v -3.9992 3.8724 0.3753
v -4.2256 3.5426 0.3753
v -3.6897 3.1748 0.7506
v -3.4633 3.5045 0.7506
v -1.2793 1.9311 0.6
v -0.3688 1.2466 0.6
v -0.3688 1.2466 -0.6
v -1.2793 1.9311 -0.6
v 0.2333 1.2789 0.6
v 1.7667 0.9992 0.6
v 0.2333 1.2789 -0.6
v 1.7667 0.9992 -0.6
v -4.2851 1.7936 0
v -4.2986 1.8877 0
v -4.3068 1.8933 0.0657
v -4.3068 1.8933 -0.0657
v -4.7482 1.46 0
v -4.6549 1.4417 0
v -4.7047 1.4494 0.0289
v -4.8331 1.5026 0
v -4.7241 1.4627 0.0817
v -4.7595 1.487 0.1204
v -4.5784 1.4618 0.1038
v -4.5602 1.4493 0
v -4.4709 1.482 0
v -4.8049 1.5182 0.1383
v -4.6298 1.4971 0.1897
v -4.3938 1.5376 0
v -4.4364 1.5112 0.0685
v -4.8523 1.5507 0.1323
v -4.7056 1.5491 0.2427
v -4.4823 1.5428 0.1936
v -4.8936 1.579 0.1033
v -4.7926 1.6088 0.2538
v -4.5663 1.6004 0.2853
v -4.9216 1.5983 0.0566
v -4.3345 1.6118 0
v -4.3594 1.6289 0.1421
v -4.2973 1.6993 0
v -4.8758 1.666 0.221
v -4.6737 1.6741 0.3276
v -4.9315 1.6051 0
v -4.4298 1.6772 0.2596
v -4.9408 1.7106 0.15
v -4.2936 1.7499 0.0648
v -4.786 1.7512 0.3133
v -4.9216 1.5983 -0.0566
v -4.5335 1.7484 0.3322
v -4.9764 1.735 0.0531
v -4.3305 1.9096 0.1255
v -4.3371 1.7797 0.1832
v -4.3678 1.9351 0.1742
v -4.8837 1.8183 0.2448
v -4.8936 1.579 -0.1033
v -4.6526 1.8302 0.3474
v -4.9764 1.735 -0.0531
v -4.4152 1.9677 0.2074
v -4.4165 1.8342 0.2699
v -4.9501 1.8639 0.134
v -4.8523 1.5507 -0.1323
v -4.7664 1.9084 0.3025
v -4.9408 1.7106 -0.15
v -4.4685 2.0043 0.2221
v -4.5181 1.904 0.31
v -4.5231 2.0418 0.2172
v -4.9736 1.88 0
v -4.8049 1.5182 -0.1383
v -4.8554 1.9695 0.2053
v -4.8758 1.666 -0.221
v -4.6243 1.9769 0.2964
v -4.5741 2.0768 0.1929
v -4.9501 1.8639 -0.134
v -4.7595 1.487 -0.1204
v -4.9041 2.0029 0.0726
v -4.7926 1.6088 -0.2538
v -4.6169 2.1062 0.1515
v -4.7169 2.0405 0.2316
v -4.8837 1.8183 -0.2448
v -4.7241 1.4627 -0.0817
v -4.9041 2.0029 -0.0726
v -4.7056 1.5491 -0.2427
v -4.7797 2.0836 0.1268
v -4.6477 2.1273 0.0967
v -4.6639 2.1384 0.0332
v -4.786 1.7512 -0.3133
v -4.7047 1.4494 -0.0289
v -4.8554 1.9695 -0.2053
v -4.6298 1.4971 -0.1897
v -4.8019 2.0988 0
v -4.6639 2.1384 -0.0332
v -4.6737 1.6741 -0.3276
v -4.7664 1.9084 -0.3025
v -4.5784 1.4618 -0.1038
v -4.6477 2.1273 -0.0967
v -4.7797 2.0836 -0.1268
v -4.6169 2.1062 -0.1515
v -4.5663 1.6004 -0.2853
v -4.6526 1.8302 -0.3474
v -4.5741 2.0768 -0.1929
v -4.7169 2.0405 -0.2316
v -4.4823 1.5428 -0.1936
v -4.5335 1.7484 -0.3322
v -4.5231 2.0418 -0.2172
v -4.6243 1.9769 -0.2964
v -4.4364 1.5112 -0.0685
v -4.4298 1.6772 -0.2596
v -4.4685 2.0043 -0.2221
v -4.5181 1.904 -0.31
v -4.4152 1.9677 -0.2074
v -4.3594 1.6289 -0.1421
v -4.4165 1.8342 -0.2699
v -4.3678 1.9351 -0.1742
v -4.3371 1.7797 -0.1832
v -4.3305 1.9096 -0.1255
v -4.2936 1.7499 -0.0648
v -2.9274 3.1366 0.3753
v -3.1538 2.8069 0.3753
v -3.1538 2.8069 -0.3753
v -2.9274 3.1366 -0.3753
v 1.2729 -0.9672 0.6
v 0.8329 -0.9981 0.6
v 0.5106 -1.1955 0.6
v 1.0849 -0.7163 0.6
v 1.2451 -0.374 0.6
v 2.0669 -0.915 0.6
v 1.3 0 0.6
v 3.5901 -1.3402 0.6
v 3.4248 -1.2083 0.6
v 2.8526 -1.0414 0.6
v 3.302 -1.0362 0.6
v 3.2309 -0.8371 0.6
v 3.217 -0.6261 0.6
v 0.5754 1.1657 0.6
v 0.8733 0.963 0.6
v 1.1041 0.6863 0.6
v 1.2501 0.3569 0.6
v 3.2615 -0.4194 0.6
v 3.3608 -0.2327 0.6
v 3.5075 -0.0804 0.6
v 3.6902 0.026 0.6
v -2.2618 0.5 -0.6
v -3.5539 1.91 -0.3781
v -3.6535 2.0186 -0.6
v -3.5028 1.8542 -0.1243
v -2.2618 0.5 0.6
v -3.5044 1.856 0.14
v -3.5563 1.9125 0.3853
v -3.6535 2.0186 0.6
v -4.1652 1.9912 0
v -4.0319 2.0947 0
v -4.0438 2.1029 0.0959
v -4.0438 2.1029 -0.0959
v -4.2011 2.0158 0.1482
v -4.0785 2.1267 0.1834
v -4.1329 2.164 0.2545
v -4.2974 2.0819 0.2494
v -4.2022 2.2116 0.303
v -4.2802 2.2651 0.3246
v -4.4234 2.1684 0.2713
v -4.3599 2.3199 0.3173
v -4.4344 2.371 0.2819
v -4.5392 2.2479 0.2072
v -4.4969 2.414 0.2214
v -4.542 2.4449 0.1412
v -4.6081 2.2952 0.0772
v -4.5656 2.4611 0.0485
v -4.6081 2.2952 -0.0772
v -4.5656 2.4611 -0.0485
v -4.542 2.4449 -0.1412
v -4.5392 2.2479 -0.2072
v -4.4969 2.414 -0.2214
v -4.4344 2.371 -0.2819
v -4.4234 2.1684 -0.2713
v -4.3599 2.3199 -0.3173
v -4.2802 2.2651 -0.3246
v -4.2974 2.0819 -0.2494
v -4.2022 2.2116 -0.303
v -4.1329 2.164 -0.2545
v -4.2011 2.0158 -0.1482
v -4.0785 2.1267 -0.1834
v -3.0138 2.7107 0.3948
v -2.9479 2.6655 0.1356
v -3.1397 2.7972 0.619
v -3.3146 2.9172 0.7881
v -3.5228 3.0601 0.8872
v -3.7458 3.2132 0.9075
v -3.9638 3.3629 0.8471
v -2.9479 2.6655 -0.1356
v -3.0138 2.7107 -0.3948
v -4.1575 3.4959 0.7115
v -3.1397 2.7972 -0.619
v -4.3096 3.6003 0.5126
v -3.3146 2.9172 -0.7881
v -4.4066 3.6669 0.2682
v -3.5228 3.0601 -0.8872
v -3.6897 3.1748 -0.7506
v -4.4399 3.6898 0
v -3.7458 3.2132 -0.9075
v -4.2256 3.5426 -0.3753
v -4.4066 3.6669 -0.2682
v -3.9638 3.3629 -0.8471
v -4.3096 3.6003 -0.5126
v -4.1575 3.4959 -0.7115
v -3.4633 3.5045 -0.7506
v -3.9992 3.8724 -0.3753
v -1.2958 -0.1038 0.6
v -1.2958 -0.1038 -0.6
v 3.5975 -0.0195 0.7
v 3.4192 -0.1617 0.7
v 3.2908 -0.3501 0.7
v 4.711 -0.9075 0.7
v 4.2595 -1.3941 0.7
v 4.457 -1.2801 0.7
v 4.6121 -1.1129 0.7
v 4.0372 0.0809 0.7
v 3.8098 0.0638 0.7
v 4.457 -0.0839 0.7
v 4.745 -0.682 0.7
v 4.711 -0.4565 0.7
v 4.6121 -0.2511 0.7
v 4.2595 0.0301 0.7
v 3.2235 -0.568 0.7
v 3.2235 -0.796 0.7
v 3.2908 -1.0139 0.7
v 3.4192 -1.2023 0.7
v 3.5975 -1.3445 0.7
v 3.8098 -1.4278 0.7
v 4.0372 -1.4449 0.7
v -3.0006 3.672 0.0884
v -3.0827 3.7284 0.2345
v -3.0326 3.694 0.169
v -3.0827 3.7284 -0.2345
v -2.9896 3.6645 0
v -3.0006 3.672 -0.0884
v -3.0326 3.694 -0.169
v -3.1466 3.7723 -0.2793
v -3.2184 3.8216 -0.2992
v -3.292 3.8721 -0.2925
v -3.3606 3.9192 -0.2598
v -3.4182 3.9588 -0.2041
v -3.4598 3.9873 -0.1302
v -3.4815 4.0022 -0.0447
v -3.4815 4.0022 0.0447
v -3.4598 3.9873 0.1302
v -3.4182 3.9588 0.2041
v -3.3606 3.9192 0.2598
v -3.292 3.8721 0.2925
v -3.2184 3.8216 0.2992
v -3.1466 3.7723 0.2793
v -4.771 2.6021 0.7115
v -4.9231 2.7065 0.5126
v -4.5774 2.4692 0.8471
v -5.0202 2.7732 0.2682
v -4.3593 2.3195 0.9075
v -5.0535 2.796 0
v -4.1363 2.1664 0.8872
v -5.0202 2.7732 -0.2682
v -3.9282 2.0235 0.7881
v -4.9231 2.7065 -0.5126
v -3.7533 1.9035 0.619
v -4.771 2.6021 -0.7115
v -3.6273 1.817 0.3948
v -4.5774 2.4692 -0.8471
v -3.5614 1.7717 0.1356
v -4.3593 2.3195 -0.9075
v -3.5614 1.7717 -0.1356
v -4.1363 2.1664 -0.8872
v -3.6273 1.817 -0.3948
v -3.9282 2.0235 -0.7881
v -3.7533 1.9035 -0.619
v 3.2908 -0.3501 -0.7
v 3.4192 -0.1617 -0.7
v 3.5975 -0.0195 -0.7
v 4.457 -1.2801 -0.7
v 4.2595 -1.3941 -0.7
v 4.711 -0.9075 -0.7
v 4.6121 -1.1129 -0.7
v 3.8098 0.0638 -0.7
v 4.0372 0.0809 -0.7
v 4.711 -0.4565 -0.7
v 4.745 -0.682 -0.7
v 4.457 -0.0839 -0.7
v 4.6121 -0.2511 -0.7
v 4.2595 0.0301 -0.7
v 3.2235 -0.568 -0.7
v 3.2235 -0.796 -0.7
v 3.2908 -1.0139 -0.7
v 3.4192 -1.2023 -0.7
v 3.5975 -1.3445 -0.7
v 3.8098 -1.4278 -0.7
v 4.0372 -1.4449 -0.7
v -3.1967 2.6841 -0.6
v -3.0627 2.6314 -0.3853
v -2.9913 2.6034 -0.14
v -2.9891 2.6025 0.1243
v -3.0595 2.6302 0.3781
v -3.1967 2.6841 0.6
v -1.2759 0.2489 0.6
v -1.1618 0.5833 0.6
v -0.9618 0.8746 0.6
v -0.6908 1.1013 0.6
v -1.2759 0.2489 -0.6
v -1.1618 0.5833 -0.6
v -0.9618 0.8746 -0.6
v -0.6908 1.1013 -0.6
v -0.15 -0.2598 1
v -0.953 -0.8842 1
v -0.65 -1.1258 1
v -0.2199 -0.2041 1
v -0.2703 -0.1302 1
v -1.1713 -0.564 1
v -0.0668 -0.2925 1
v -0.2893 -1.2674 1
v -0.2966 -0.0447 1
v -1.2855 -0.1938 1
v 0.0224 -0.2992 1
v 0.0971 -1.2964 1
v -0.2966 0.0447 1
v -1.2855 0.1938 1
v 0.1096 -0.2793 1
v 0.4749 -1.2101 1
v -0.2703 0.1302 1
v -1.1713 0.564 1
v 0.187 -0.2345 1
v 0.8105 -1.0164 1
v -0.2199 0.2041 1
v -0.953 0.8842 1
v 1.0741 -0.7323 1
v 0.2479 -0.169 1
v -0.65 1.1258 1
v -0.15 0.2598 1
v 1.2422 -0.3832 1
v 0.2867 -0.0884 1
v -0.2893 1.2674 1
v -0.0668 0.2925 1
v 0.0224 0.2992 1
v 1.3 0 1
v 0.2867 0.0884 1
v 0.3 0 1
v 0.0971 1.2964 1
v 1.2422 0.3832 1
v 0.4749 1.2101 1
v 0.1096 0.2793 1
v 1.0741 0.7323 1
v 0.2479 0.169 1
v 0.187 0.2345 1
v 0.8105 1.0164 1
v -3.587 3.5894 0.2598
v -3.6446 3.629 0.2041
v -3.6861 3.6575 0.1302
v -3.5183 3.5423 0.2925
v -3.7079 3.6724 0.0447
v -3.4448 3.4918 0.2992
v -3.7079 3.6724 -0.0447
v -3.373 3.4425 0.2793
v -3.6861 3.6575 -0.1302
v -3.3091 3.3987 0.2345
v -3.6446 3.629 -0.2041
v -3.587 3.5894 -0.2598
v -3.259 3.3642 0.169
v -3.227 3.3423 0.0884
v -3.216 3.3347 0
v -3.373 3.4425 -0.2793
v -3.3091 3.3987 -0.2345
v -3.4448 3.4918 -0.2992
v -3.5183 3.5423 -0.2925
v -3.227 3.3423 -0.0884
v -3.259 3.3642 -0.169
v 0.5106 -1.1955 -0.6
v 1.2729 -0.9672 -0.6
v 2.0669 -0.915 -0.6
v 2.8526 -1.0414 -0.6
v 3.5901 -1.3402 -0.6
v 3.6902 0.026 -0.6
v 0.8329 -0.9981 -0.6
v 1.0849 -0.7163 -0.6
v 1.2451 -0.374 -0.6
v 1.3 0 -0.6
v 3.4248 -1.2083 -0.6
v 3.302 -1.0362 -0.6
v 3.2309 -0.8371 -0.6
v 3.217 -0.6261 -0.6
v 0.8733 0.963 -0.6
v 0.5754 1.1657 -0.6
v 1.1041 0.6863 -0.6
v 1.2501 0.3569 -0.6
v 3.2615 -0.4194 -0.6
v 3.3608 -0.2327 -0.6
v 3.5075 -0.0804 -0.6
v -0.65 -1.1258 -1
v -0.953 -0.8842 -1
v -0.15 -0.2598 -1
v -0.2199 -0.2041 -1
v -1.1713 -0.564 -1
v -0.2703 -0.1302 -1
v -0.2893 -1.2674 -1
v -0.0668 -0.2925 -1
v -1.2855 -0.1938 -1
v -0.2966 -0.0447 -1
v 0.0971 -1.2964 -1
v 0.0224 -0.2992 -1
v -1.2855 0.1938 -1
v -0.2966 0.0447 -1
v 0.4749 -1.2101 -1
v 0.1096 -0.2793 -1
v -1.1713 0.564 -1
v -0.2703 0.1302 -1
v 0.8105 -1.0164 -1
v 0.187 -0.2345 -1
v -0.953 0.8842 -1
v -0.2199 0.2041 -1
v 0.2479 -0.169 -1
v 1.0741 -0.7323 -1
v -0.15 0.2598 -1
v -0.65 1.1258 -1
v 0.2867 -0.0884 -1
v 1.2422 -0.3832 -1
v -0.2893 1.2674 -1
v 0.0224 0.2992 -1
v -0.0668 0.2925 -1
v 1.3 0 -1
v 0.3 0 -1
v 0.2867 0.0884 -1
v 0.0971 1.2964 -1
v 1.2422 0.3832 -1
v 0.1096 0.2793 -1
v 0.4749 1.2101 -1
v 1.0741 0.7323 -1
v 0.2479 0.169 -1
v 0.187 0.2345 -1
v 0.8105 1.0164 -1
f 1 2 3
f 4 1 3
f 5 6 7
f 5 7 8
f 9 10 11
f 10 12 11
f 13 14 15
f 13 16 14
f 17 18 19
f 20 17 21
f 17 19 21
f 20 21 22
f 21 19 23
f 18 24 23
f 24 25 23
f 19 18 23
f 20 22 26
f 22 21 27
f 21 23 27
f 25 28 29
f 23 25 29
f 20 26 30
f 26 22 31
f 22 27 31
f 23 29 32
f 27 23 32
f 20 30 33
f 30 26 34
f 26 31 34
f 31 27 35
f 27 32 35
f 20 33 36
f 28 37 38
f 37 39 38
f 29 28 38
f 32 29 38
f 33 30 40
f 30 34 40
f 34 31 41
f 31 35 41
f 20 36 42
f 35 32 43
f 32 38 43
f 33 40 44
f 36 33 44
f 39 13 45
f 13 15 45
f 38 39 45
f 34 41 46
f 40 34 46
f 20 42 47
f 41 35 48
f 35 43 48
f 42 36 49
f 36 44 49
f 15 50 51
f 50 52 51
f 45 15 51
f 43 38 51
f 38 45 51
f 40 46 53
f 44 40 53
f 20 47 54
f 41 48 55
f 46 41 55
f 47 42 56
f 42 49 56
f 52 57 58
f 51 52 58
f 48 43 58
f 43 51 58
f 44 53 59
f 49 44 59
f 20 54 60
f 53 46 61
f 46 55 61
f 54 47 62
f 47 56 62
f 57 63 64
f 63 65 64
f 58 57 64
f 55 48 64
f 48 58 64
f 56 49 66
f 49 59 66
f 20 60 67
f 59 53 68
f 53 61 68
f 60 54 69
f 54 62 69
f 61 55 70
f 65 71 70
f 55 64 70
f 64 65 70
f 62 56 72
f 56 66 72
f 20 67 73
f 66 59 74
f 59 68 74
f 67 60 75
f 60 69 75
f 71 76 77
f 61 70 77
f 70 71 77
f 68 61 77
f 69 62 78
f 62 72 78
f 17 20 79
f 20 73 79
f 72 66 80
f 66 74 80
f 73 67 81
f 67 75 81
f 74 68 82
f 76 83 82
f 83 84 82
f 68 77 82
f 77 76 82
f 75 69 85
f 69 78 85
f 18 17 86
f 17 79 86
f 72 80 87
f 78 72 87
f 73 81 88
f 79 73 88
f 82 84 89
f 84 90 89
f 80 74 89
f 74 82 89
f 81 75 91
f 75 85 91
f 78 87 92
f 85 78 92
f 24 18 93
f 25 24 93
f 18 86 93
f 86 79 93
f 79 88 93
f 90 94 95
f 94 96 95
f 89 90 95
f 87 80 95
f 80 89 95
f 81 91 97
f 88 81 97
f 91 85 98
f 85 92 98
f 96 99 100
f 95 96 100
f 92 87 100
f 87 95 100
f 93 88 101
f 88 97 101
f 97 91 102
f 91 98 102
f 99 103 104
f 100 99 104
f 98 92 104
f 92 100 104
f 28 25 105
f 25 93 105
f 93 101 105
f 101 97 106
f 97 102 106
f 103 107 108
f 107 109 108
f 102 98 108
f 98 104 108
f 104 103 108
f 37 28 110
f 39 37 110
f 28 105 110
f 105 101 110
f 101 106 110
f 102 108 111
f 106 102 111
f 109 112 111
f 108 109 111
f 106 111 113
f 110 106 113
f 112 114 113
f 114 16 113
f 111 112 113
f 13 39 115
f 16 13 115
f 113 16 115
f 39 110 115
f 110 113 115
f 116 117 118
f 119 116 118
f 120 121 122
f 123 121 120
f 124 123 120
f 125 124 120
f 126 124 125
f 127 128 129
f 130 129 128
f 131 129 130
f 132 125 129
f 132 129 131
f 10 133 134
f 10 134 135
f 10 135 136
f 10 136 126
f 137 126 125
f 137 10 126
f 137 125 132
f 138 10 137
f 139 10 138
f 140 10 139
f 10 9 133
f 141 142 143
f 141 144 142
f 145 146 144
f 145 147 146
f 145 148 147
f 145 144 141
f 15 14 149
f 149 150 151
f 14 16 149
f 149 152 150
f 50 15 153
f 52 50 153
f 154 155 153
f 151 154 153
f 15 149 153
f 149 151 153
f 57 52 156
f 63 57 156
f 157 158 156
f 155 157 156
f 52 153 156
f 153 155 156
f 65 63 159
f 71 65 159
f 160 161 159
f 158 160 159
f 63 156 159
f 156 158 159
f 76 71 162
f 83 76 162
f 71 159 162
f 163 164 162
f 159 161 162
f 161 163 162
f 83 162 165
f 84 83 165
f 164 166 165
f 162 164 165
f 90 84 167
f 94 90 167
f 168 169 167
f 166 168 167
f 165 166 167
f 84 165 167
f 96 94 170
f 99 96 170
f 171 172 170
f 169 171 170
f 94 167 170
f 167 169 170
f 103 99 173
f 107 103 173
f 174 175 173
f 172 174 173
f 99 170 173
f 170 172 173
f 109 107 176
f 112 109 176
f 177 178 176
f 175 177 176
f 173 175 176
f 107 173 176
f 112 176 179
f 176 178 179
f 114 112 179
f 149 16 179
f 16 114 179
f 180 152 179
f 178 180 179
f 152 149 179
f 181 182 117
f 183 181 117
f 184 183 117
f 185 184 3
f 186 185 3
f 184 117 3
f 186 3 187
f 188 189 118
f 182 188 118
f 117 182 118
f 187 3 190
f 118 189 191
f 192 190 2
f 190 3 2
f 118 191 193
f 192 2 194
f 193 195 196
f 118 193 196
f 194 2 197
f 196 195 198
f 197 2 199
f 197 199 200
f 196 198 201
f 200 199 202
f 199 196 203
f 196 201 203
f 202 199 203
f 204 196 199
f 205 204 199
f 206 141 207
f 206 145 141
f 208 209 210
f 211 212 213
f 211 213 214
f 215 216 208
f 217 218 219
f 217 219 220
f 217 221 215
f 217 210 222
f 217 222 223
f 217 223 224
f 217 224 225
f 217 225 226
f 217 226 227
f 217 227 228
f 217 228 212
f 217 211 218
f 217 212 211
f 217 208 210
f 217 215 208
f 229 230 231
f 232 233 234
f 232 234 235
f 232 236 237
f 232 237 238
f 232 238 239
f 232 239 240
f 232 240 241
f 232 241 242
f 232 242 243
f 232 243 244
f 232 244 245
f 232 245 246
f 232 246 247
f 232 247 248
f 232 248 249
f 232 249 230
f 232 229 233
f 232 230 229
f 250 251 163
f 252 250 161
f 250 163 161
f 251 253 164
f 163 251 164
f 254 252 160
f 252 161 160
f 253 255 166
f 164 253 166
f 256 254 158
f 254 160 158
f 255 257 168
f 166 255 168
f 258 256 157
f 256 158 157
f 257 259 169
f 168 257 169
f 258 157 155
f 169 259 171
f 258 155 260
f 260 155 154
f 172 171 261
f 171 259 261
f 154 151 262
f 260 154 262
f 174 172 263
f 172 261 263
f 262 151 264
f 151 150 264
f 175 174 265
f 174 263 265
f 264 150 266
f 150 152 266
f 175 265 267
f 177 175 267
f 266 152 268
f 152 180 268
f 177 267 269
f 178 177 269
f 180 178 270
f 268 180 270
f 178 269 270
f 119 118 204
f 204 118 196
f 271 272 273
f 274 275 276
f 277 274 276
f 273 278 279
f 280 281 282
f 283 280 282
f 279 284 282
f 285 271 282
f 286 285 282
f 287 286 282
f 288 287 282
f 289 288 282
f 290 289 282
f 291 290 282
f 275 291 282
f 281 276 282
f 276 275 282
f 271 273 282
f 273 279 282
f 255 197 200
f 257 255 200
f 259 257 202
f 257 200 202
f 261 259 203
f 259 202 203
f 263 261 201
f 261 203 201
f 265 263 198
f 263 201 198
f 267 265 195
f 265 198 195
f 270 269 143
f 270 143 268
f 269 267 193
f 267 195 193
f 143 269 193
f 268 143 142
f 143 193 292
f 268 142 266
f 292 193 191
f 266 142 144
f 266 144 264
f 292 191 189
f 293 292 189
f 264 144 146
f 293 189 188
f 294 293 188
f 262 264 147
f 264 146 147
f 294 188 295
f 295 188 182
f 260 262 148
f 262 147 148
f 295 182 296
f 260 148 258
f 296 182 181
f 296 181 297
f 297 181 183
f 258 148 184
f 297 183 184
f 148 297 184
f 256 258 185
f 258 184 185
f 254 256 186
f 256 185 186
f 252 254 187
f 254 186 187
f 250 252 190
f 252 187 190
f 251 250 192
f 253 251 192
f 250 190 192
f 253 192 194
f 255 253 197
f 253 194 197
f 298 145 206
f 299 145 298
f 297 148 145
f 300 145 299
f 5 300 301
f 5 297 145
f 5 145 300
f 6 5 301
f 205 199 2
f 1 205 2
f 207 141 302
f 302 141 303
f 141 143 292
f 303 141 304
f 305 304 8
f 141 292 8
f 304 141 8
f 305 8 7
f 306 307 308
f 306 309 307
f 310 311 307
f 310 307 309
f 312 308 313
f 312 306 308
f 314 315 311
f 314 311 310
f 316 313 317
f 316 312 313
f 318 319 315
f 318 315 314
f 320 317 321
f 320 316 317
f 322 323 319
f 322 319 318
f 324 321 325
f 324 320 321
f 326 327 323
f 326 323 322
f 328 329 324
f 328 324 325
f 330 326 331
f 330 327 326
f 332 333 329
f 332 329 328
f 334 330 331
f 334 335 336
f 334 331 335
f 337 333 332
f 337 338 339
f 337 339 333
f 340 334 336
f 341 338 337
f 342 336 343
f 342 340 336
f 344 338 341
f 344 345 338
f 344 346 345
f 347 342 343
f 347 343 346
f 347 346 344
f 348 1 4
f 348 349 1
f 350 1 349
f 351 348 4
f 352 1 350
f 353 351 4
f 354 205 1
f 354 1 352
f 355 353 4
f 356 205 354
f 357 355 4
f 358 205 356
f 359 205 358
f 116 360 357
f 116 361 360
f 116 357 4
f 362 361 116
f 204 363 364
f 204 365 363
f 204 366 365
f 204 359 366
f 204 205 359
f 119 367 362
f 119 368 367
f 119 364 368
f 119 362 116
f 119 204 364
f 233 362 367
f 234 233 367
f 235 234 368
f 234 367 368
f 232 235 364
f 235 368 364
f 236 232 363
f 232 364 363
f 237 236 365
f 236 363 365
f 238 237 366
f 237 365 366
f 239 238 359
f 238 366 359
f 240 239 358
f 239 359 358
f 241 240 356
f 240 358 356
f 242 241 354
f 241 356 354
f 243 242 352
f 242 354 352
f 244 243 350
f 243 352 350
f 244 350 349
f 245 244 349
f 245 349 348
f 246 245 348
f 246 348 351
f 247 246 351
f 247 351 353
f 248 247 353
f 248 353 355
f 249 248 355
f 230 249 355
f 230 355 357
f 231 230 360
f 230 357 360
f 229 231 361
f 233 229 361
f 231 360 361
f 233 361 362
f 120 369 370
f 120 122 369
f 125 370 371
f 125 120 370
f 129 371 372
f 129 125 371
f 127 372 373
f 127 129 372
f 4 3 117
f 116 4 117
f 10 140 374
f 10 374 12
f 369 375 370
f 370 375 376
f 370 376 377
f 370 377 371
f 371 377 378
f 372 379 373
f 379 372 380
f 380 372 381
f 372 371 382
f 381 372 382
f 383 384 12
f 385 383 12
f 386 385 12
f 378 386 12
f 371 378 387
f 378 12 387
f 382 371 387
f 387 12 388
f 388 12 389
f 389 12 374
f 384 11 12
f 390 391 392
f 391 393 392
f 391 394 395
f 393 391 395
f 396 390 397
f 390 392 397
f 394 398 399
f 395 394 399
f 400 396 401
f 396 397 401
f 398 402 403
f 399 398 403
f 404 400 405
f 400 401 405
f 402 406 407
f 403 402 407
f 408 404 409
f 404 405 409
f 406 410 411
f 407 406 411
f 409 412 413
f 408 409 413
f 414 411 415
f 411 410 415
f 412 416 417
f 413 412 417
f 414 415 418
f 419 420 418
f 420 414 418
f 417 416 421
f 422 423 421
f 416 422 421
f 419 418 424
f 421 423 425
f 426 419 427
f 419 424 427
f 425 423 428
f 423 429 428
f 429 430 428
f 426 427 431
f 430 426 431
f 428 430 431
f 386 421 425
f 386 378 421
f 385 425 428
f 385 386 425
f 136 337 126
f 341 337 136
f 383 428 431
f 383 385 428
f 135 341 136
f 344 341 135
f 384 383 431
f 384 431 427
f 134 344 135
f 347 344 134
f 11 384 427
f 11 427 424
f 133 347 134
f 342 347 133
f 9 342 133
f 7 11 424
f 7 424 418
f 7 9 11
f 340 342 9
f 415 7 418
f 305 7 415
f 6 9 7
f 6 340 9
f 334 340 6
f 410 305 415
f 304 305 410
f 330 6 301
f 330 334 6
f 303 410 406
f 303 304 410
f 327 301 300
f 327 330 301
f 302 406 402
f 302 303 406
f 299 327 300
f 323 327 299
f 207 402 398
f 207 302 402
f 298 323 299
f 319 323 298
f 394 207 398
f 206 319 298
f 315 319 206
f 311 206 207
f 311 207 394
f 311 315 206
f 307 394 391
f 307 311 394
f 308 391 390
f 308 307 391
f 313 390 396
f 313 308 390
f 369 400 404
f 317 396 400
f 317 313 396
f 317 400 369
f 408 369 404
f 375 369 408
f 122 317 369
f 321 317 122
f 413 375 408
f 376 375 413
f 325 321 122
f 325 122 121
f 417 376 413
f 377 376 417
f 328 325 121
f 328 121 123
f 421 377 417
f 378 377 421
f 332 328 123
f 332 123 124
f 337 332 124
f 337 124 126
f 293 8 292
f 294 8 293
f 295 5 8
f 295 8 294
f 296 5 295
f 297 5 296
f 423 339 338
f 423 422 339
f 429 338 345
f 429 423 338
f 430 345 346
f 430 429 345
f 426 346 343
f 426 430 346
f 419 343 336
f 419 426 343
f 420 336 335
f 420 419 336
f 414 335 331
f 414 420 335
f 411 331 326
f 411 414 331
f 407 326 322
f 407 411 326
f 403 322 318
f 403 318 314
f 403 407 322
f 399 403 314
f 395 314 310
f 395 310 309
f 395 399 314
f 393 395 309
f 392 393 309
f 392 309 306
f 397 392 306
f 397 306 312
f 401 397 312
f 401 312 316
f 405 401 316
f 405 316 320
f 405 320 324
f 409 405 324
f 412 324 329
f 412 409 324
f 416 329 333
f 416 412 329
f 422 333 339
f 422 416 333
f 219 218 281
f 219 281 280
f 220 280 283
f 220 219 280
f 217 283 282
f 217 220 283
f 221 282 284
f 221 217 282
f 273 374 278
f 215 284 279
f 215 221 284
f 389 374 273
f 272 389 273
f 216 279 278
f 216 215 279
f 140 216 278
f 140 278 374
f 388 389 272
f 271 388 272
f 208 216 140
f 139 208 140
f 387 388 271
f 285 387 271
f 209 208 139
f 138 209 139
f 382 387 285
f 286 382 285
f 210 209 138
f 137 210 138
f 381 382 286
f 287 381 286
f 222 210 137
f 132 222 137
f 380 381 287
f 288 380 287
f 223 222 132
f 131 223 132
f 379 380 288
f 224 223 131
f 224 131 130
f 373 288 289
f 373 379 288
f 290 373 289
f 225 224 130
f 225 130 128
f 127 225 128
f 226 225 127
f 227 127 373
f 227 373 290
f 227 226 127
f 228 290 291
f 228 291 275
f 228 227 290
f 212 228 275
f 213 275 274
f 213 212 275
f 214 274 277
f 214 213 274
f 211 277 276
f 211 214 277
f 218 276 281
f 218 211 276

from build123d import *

# Parameters (mm, degrees)
SKETCH1_R           = 0.3
BOSS_EXTRUDE1_DEPTH = 1
BOSS_EXTRUDE2_DEPTH = 0.7
BOSS_EXTRUDE3_DEPTH = 0.6
BOSS_EXTRUDE4_DEPTH = 0.6
BOSS_EXTRUDE5_DEPTH = 0.4
SKETCH6_R           = 0.3
BOSS_EXTRUDE6_DEPTH = 0.4


with BuildPart() as part:
    # Sketch1 → Boss-Extrude1 (new, symmetric)
    with BuildSketch(Plane.XY):
        with BuildLine():
            ThreePointArc((1.3, 0), (0.998317392, 0.832683844), (0.233288639, 1.27889656))
            ThreePointArc((0.233288639, 1.27889656), (-0.069645296, 1.298133095), (-0.368782161, 1.24659525))
            ThreePointArc((-0.368782161, 1.24659525), (-1.071749439, 0.735767042), (-1.295848634, -0.103809043))
            ThreePointArc((-1.295848634, -0.103809043), (-0.6723843, -1.112609255), (0.510625375, -1.195517347))
            ThreePointArc((0.510625375, -1.195517347), (1.084853213, -0.716305456), (1.3, 0))
        make_face()
        Circle(SKETCH1_R, mode=Mode.SUBTRACT)
    extrude(amount=BOSS_EXTRUDE1_DEPTH, both=True)



with BuildPart() as body_2:
    # Sketch1<3> → Boss-Extrude2 (new, symmetric)
    with BuildSketch(Plane.XY):
        with BuildLine():
            ThreePointArc((4.745, -0.682), (4.406355459, -0.046825991), (3.690239158, 0.025999756))
            ThreePointArc((3.690239158, 0.025999756), (3.217046127, -0.626085884), (3.590115999, -1.340191056))
            ThreePointArc((3.590115999, -1.340191056), (4.358790008, -1.346637593), (4.745, -0.682))
        make_face()
    extrude(amount=BOSS_EXTRUDE2_DEPTH, both=True)


with BuildPart() as part_1:
    add(part.part)

    add(body_2.part)  # Boss-Extrude3 merges body 2
    # Sketch1<4> → Boss-Extrude3 (add, symmetric)
    with BuildSketch(Plane.XY):
        with BuildLine():
            ThreePointArc((3.590115999, -1.340191056), (3.217046127, -0.626085884), (3.690239158, 0.025999756))
            Line((3.690239158, 0.025999756), (1.766699303, 0.999180984))
            Line((1.766699303, 0.999180984), (0.233288639, 1.27889656))
            ThreePointArc((0.233288639, 1.27889656), (0.998317392, 0.832683844), (1.3, 0))
            ThreePointArc((1.3, 0), (1.084853213, -0.716305456), (0.510625375, -1.195517347))
            ThreePointArc((0.510625375, -1.195517347), (2.066949931, -0.914952316), (3.590115999, -1.340191056))
        make_face()
    extrude(amount=BOSS_EXTRUDE3_DEPTH, both=True)

    # Sketch1<5> → Boss-Extrude4 (add, symmetric)
    with BuildSketch(Plane.XY):
        with BuildLine():
            ThreePointArc((-1.295848634, -0.103809043), (-1.071749439, 0.735767042), (-0.368782161, 1.24659525))
            Line((-0.368782161, 1.24659525), (-1.279338258, 1.931105297))
            Line((-1.279338258, 1.931105297), (-3.469420101, 2.791170079))
            Line((-3.469420101, 2.791170079), (-3.851452989, 2.234684794))
            Line((-3.851452989, 2.234684794), (-2.261840722, 0.499950592))
            Line((-2.261840722, 0.499950592), (-1.295848634, -0.103809043))
        make_face()
    extrude(amount=BOSS_EXTRUDE4_DEPTH, both=True)



with BuildPart() as body_2_2:
    # Sketch2 → Revolve1 (revolve)
    with BuildSketch(Plane.XY):
        with BuildLine():
            Line((-3.851452989, 2.234684794), (-3.443951242, 2.828269098))
            Line((-3.443951242, 2.828269098), (-3.769598187, 3.051829084))
            Line((-3.769598187, 3.051829084), (-4.833144721, 1.502622153))
            ThreePointArc((-4.833144721, 1.502622153), (-4.430488377, 1.507175235), (-4.298614364, 1.887651393))
            Line((-4.298614364, 1.887651393), (-3.851452989, 2.234684794))
        make_face()
    revolve(axis=Axis((-3.769598187, 3.051829084, 0), (-0.5659746478395021, -0.8244226452511791, 0)))


with BuildPart() as part_2:
    add(part_1.part)

    add(body_2_2.part)  # Revolve2 merges body 2 2
    # Sketch4 → Revolve2 (revolve)
    with BuildSketch(Plane.XY):
        Polygon((-3.68969938, 3.174750981), (-4.303268205, 2.281000641), (-5.053492813, 2.796037571), (-4.439923988, 3.68978791), align=None)
    revolve(axis=Axis((-3.68969938, 3.174750981, 0), (-0.5659746478395026, -0.8244226452511788, 0)))

    # Sketch5 → Boss-Extrude5 (add)
    with BuildSketch(Plane(origin=(0.299434714, 0.436169287, 0), x_dir=(0.8244226452511788, -0.5659746478395026, 0), z_dir=(0.5659746478395026, 0.8244226452511788, 0))):
        Polygon((-4.838700292, 0.75055535), (-5.488700292, 0.375277675), (-5.488700292, -0.375277675), (-4.838700292, -0.75055535), (-4.188700292, -0.375277675), (-4.188700292, 0.375277675), align=None)
    extrude(amount=BOSS_EXTRUDE5_DEPTH)

    # Sketch6 → Boss-Extrude6 (add)
    with BuildSketch(Plane(origin=(0.525824573, 0.765938345, 0), x_dir=(0.8244226452511786, -0.565974647839503, 0), z_dir=(0.565974647839503, 0.8244226452511787, 0))):
        with Locations((-4.838700292, 0)):
            Circle(SKETCH6_R)
    extrude(amount=BOSS_EXTRUDE6_DEPTH)


solid = part_2.part
